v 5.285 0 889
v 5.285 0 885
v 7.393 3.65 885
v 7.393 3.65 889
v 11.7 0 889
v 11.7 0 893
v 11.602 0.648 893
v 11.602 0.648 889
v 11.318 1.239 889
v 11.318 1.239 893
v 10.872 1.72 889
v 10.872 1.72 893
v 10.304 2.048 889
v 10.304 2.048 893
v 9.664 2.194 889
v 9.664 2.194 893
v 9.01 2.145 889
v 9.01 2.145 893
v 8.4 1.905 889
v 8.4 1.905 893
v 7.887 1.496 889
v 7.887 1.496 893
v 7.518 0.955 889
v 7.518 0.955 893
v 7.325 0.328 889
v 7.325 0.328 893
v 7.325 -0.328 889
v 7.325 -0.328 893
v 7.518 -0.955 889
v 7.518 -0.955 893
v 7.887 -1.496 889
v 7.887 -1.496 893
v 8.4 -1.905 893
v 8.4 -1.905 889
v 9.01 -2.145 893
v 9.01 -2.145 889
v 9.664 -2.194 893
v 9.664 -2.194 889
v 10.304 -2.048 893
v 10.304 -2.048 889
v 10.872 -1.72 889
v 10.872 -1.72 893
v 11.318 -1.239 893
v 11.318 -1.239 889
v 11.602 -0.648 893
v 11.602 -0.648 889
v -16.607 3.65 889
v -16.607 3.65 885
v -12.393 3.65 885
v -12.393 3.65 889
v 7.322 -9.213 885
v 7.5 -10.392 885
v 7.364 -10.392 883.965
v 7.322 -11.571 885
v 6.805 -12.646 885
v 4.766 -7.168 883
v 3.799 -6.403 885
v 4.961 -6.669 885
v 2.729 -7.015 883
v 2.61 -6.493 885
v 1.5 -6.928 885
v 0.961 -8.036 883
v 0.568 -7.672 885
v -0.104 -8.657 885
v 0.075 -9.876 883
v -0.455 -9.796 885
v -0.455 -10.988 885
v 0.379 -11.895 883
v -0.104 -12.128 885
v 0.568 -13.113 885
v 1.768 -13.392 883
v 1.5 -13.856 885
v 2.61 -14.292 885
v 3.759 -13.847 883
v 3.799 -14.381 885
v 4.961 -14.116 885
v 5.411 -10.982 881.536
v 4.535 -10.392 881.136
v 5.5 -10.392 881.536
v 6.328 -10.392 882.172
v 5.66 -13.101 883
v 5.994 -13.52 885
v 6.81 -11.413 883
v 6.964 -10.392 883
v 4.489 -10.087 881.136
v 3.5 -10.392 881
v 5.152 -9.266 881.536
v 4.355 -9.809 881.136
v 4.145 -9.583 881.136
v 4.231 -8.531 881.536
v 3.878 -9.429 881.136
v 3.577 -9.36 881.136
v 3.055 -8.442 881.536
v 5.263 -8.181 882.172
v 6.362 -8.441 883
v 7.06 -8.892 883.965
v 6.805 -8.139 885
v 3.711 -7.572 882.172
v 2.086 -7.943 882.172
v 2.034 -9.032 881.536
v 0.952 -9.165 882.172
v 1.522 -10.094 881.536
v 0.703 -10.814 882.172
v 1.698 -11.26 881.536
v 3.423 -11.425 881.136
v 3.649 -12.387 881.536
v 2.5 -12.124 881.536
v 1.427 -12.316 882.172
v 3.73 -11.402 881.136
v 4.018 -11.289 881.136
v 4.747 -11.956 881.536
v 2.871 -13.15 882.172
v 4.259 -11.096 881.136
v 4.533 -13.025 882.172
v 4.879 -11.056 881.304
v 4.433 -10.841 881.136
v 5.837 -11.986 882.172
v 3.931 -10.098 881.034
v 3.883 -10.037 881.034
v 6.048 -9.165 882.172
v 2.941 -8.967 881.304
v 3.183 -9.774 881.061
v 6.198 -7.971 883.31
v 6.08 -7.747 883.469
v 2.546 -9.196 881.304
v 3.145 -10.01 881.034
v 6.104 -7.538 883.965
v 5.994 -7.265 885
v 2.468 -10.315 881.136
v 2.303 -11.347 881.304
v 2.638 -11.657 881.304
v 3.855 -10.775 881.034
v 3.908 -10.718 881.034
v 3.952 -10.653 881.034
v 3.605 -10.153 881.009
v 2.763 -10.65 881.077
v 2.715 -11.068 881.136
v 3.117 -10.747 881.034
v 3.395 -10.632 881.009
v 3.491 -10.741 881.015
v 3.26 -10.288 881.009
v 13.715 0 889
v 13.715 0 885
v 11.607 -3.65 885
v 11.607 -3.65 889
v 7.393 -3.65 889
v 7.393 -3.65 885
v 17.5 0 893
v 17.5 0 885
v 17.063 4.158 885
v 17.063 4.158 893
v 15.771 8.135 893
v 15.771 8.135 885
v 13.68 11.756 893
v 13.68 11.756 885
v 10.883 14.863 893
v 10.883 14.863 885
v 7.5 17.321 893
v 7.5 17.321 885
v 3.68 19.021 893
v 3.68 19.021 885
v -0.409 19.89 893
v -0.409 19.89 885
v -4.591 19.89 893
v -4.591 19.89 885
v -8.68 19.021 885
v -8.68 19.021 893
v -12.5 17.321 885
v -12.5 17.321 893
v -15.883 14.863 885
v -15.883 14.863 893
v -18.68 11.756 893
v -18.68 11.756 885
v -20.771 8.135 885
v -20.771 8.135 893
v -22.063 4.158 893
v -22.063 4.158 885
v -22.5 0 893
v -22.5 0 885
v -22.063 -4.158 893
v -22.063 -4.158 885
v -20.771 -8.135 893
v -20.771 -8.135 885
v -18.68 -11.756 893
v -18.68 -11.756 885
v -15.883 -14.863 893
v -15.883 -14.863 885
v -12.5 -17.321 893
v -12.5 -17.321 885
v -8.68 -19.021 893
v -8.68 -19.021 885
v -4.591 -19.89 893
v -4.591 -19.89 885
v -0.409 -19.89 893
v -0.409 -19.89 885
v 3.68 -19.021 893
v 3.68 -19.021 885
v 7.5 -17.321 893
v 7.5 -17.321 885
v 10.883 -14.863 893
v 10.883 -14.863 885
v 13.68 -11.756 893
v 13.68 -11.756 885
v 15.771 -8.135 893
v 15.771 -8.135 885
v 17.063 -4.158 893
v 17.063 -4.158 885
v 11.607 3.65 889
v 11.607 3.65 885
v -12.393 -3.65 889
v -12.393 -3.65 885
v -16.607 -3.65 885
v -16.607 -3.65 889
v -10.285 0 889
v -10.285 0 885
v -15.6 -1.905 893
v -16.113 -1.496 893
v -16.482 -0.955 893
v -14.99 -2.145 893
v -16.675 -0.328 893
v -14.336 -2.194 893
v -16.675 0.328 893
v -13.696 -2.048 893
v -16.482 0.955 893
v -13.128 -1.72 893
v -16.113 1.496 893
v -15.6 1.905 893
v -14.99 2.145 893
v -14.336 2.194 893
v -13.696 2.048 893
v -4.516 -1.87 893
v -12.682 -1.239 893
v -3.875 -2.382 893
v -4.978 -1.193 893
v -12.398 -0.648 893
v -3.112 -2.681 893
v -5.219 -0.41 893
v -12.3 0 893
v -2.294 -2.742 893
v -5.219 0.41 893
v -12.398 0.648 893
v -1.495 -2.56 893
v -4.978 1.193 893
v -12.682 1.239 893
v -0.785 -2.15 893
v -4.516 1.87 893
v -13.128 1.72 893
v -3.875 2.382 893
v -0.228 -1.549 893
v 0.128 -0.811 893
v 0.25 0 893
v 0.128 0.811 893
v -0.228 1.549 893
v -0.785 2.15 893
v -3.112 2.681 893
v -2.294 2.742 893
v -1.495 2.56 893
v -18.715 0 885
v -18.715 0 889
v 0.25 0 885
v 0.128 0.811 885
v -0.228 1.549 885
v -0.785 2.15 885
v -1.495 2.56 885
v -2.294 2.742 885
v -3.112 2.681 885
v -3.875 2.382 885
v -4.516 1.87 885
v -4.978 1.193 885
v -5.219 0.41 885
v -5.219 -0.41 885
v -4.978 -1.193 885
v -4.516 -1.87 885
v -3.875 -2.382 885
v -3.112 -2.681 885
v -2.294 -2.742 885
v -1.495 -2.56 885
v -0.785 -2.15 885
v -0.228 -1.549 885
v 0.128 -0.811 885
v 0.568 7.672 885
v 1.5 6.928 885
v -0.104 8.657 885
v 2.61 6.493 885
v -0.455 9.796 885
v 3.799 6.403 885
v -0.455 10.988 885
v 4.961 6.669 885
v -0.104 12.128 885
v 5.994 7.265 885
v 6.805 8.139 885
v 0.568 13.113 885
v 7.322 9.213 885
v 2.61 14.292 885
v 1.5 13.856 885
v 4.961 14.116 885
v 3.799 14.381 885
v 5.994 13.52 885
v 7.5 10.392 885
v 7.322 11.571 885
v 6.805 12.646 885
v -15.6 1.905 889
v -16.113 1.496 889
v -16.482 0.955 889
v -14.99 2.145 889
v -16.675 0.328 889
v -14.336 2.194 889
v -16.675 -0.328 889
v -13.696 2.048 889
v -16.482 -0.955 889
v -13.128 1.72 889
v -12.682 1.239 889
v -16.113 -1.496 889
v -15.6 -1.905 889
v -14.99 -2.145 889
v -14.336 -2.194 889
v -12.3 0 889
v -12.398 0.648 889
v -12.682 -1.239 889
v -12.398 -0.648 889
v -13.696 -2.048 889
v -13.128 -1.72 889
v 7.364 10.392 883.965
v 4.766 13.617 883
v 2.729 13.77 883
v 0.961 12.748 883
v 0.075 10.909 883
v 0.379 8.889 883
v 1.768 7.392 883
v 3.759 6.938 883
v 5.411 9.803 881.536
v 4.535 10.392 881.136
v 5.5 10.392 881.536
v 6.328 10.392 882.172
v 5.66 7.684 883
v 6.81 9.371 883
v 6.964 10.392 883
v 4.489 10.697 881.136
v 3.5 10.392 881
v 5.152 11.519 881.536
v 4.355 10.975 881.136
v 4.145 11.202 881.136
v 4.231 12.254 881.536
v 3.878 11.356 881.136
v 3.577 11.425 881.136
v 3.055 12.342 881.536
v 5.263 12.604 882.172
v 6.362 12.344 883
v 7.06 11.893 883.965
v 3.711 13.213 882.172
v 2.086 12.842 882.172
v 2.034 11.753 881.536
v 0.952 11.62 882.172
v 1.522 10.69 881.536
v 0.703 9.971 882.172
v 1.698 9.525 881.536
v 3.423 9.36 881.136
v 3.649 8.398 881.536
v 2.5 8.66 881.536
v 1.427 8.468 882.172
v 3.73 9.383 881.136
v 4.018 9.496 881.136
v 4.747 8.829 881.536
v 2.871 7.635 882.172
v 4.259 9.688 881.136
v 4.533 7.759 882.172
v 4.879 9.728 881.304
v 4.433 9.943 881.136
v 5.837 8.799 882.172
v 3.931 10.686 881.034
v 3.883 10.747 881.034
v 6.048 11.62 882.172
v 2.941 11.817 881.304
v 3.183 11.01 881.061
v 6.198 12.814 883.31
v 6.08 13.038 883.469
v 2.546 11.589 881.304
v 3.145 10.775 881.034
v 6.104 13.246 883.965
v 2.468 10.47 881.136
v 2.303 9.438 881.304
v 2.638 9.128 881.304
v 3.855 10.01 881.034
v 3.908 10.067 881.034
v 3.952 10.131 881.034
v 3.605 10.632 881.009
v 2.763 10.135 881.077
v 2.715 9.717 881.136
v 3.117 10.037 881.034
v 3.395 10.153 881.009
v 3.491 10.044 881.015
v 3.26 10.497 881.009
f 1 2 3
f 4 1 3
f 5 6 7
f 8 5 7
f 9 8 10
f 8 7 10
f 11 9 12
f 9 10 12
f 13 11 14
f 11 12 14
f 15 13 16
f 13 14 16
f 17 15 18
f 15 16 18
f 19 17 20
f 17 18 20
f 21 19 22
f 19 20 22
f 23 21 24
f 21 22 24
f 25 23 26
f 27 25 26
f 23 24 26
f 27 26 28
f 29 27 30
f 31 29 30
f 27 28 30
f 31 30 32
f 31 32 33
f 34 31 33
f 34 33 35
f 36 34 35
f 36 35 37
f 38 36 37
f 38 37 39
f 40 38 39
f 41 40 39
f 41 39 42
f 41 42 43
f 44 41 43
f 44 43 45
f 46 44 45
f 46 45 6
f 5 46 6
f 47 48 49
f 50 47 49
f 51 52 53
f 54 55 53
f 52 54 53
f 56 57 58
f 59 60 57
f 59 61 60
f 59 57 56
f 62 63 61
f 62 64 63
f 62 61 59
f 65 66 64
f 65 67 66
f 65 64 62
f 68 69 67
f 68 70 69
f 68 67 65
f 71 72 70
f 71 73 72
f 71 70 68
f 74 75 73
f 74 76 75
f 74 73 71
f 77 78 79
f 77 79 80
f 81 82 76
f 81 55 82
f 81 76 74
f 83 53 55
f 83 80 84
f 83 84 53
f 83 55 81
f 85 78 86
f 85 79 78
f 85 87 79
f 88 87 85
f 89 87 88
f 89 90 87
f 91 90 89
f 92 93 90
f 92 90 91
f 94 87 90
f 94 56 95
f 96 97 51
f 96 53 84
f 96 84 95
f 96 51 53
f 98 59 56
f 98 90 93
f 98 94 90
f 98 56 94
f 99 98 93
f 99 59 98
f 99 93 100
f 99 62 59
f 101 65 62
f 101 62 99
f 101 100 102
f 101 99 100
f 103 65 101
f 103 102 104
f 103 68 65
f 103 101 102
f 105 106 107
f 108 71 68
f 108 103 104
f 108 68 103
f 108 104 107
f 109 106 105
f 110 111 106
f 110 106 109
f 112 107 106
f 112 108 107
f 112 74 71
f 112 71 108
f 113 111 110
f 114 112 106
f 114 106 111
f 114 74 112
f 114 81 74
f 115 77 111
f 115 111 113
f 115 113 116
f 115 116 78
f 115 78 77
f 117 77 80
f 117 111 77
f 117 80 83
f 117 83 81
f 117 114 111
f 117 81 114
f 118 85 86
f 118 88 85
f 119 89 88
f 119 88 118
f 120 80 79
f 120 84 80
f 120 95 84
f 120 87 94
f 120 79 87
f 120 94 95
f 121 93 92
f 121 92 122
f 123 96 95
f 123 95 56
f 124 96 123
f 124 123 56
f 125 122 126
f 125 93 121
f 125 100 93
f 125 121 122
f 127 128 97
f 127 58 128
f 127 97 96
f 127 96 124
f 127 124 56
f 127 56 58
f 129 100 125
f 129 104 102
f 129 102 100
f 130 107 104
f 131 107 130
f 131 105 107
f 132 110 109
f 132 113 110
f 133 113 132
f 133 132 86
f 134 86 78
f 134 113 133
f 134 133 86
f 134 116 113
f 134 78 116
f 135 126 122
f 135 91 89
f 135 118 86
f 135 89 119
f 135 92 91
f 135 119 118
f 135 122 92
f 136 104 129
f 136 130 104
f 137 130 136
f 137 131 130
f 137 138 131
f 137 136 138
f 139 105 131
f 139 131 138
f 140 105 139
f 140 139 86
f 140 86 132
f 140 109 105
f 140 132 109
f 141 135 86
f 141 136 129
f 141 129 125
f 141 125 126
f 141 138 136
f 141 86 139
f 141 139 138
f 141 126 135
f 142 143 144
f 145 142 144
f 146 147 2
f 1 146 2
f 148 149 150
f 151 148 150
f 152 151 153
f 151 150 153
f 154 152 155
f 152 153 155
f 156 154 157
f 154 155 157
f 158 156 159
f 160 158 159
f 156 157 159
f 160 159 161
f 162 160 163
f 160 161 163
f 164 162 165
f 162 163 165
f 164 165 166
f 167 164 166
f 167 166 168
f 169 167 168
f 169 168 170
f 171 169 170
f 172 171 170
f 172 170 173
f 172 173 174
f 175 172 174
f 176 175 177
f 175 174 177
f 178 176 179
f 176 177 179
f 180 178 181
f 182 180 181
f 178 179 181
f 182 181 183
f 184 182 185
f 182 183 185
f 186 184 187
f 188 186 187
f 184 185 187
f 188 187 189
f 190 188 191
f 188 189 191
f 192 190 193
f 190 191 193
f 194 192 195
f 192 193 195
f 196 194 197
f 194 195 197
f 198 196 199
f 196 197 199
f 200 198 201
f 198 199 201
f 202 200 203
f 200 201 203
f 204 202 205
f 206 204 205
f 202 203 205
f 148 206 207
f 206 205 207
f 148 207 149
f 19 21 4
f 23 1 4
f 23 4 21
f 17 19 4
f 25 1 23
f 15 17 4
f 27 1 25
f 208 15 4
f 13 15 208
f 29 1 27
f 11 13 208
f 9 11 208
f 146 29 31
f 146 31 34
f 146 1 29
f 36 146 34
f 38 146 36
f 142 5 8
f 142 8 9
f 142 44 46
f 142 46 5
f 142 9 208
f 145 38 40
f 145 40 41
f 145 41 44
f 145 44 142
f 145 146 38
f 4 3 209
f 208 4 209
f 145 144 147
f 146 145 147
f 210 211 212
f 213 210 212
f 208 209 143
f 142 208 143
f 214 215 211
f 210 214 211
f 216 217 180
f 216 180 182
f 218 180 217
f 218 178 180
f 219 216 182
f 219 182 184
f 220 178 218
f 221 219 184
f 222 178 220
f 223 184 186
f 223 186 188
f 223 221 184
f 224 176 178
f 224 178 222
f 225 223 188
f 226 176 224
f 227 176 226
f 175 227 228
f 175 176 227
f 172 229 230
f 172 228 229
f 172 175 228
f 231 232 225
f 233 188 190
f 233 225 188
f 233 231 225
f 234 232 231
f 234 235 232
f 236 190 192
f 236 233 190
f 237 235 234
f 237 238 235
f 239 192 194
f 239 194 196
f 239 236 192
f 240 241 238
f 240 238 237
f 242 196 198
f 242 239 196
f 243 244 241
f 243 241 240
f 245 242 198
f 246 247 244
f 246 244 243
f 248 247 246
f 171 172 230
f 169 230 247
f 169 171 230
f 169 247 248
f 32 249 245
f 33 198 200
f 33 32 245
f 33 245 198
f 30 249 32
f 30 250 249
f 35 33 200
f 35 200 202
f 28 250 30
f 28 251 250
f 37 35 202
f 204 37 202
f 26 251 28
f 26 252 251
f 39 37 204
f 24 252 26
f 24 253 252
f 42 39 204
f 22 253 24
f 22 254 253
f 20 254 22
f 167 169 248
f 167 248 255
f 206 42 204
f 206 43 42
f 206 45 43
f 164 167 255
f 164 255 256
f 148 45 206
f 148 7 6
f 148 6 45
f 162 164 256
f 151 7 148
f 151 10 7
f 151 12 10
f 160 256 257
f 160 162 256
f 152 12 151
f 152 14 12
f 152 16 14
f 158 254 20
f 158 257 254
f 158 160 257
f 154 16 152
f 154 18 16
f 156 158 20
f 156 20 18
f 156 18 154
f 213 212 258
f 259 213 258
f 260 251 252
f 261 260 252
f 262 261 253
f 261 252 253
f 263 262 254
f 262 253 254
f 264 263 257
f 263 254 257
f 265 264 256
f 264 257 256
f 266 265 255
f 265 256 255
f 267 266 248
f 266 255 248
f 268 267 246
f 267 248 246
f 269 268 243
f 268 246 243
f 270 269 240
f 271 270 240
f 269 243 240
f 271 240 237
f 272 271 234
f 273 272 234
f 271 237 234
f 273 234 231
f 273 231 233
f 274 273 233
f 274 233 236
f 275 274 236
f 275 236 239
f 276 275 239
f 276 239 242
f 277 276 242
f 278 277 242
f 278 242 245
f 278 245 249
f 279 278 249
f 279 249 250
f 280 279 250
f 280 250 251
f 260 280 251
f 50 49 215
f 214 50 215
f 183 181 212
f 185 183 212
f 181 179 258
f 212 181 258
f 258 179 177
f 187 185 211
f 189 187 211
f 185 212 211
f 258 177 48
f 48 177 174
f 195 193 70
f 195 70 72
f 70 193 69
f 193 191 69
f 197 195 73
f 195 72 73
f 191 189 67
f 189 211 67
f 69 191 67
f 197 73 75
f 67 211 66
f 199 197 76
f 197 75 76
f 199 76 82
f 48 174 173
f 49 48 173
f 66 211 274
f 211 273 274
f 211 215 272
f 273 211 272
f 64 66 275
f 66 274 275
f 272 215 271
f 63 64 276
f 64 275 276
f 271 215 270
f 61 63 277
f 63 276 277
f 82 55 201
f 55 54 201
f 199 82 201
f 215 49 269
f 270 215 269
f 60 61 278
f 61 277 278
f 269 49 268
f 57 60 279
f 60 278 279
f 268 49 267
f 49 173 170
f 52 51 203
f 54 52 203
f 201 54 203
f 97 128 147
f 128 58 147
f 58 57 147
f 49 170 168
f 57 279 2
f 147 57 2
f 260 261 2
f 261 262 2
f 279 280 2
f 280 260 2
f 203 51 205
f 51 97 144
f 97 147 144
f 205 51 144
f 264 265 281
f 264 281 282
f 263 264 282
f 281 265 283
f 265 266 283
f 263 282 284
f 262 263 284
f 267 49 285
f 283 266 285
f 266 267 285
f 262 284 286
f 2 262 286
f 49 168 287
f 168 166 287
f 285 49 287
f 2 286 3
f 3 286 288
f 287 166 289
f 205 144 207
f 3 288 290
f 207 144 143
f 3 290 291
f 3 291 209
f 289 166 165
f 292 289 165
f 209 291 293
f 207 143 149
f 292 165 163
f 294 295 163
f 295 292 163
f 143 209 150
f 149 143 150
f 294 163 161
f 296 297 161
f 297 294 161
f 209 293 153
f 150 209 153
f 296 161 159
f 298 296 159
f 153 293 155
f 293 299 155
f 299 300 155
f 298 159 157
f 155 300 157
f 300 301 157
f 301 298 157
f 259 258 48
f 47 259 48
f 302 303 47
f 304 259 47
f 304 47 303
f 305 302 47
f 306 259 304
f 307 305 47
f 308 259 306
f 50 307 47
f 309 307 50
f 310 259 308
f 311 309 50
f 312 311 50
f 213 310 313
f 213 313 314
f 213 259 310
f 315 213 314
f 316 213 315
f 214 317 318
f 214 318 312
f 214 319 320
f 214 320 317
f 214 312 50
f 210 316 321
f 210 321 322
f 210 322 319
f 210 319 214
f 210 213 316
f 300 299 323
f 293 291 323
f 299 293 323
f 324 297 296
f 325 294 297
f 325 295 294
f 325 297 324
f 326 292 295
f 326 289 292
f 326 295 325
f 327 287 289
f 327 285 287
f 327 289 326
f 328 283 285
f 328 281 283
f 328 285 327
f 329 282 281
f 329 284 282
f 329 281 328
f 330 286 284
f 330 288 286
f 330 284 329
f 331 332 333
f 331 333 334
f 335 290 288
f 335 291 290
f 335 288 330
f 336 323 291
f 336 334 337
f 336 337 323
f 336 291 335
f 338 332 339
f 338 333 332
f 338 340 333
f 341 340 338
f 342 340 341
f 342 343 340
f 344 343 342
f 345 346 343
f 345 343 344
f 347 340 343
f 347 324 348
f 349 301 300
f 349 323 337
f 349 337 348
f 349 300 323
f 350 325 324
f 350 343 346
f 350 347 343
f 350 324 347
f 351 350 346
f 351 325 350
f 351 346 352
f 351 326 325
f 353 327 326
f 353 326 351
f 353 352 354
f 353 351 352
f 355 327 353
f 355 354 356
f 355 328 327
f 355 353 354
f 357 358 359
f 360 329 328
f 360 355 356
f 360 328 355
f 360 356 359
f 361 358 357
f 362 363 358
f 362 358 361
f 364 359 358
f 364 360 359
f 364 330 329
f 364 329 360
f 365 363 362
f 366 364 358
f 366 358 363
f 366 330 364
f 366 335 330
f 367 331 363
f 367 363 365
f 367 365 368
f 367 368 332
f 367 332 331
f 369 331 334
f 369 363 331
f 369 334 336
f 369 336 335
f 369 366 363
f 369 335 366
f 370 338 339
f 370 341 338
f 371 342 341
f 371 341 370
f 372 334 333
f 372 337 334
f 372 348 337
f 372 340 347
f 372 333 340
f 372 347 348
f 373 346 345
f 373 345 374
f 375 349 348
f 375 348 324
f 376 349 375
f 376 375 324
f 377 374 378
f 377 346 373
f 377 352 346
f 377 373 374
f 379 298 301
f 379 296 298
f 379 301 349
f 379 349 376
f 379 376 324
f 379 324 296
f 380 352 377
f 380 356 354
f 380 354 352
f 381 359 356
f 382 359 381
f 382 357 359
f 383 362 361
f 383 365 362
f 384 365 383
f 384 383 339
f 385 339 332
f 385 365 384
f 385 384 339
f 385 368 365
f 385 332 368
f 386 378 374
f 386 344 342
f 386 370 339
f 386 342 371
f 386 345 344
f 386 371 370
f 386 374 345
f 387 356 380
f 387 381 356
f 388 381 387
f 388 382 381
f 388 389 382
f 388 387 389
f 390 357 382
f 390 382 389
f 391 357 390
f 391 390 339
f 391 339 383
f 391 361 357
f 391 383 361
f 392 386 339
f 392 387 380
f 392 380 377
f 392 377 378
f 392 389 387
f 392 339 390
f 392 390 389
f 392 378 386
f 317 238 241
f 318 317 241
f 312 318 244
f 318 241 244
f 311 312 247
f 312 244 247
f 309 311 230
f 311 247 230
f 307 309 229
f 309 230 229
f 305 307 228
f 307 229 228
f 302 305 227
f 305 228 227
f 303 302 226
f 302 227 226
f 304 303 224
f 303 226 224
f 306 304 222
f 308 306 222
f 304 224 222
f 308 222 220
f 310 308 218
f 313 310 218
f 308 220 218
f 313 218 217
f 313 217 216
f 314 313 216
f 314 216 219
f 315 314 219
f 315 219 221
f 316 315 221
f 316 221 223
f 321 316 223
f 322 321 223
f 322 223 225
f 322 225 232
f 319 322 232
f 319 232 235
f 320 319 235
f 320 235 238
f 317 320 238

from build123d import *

# Parameters (mm, degrees)
CYLINDER005_R     = 20
CYLINDER005_DEPTH = 8
SKETCH006_R       = 2.2
SKETCH006_R_2     = 2.75
POCKET004_DEPTH   = 12.001
POCKET005_DEPTH   = 4


with BuildPart() as part:
    # Cylinder005 → Cylinder005 (join)
    with BuildSketch(Plane.XY):
        Circle(CYLINDER005_R)
    extrude(amount=CYLINDER005_DEPTH)

    # Sphere → Sphere (revolve)
    with BuildSketch(Plane(origin=(6, 10.392305, 0), x_dir=(1, 0, 0), z_dir=(0, -1, 0))):
        with BuildLine():
            ThreePointArc((0, -4), (2.828427, -2.828427), (4, 0))
            Line((4, 0), (0, 0))
            Line((0, 0), (0, -4))
        make_face()
    revolve(axis=Axis((6, 10.392305, 0), (0, 0, 1)))

    # Sphere001 → Sphere001 (revolve)
    with BuildSketch(Plane(origin=(6, -10.392305, 0), x_dir=(1, 0, 0), z_dir=(0, -1, 0))):
        with BuildLine():
            ThreePointArc((0, -4), (2.828427, -2.828427), (4, 0))
            Line((4, 0), (0, 0))
            Line((0, 0), (0, -4))
        make_face()
    revolve(axis=Axis((6, -10.392305, 0), (0, 0, 1)))

    # Sketch006 (on DatumPlane) → Pocket004 (cut, through all)
    with BuildSketch(Plane.XY.offset(8)):
        with Locations((-12, 0)):
            Circle(SKETCH006_R)
        with Locations((12, 0)):
            Circle(SKETCH006_R)
        Circle(SKETCH006_R_2)
    extrude(amount=-POCKET004_DEPTH, mode=Mode.SUBTRACT)

    # Sketch063 (on DatumPlane) → Pocket005 (cut)
    with BuildSketch(Plane(origin=(0, 0, 0), x_dir=(1, 0, 0), z_dir=(0, 0, -1))):
        Polygon((-9.892672, -3.65), (-7.785343, 0), (-9.892672, 3.65), (-14.107328, 3.65), (-16.214657, 0), (-14.107328, -3.65), align=None)
        Polygon((14.107328, -3.65), (16.214657, 0), (14.107328, 3.65), (9.892672, 3.65), (7.785343, 0), (9.892672, -3.65), align=None)
    extrude(amount=-POCKET005_DEPTH, mode=Mode.SUBTRACT)


with BuildPart() as part_1:
    # Body022003 placement: moved
    add(part.part.moved(Location((-2.5, 0, 885))))


solid = part_1.part
